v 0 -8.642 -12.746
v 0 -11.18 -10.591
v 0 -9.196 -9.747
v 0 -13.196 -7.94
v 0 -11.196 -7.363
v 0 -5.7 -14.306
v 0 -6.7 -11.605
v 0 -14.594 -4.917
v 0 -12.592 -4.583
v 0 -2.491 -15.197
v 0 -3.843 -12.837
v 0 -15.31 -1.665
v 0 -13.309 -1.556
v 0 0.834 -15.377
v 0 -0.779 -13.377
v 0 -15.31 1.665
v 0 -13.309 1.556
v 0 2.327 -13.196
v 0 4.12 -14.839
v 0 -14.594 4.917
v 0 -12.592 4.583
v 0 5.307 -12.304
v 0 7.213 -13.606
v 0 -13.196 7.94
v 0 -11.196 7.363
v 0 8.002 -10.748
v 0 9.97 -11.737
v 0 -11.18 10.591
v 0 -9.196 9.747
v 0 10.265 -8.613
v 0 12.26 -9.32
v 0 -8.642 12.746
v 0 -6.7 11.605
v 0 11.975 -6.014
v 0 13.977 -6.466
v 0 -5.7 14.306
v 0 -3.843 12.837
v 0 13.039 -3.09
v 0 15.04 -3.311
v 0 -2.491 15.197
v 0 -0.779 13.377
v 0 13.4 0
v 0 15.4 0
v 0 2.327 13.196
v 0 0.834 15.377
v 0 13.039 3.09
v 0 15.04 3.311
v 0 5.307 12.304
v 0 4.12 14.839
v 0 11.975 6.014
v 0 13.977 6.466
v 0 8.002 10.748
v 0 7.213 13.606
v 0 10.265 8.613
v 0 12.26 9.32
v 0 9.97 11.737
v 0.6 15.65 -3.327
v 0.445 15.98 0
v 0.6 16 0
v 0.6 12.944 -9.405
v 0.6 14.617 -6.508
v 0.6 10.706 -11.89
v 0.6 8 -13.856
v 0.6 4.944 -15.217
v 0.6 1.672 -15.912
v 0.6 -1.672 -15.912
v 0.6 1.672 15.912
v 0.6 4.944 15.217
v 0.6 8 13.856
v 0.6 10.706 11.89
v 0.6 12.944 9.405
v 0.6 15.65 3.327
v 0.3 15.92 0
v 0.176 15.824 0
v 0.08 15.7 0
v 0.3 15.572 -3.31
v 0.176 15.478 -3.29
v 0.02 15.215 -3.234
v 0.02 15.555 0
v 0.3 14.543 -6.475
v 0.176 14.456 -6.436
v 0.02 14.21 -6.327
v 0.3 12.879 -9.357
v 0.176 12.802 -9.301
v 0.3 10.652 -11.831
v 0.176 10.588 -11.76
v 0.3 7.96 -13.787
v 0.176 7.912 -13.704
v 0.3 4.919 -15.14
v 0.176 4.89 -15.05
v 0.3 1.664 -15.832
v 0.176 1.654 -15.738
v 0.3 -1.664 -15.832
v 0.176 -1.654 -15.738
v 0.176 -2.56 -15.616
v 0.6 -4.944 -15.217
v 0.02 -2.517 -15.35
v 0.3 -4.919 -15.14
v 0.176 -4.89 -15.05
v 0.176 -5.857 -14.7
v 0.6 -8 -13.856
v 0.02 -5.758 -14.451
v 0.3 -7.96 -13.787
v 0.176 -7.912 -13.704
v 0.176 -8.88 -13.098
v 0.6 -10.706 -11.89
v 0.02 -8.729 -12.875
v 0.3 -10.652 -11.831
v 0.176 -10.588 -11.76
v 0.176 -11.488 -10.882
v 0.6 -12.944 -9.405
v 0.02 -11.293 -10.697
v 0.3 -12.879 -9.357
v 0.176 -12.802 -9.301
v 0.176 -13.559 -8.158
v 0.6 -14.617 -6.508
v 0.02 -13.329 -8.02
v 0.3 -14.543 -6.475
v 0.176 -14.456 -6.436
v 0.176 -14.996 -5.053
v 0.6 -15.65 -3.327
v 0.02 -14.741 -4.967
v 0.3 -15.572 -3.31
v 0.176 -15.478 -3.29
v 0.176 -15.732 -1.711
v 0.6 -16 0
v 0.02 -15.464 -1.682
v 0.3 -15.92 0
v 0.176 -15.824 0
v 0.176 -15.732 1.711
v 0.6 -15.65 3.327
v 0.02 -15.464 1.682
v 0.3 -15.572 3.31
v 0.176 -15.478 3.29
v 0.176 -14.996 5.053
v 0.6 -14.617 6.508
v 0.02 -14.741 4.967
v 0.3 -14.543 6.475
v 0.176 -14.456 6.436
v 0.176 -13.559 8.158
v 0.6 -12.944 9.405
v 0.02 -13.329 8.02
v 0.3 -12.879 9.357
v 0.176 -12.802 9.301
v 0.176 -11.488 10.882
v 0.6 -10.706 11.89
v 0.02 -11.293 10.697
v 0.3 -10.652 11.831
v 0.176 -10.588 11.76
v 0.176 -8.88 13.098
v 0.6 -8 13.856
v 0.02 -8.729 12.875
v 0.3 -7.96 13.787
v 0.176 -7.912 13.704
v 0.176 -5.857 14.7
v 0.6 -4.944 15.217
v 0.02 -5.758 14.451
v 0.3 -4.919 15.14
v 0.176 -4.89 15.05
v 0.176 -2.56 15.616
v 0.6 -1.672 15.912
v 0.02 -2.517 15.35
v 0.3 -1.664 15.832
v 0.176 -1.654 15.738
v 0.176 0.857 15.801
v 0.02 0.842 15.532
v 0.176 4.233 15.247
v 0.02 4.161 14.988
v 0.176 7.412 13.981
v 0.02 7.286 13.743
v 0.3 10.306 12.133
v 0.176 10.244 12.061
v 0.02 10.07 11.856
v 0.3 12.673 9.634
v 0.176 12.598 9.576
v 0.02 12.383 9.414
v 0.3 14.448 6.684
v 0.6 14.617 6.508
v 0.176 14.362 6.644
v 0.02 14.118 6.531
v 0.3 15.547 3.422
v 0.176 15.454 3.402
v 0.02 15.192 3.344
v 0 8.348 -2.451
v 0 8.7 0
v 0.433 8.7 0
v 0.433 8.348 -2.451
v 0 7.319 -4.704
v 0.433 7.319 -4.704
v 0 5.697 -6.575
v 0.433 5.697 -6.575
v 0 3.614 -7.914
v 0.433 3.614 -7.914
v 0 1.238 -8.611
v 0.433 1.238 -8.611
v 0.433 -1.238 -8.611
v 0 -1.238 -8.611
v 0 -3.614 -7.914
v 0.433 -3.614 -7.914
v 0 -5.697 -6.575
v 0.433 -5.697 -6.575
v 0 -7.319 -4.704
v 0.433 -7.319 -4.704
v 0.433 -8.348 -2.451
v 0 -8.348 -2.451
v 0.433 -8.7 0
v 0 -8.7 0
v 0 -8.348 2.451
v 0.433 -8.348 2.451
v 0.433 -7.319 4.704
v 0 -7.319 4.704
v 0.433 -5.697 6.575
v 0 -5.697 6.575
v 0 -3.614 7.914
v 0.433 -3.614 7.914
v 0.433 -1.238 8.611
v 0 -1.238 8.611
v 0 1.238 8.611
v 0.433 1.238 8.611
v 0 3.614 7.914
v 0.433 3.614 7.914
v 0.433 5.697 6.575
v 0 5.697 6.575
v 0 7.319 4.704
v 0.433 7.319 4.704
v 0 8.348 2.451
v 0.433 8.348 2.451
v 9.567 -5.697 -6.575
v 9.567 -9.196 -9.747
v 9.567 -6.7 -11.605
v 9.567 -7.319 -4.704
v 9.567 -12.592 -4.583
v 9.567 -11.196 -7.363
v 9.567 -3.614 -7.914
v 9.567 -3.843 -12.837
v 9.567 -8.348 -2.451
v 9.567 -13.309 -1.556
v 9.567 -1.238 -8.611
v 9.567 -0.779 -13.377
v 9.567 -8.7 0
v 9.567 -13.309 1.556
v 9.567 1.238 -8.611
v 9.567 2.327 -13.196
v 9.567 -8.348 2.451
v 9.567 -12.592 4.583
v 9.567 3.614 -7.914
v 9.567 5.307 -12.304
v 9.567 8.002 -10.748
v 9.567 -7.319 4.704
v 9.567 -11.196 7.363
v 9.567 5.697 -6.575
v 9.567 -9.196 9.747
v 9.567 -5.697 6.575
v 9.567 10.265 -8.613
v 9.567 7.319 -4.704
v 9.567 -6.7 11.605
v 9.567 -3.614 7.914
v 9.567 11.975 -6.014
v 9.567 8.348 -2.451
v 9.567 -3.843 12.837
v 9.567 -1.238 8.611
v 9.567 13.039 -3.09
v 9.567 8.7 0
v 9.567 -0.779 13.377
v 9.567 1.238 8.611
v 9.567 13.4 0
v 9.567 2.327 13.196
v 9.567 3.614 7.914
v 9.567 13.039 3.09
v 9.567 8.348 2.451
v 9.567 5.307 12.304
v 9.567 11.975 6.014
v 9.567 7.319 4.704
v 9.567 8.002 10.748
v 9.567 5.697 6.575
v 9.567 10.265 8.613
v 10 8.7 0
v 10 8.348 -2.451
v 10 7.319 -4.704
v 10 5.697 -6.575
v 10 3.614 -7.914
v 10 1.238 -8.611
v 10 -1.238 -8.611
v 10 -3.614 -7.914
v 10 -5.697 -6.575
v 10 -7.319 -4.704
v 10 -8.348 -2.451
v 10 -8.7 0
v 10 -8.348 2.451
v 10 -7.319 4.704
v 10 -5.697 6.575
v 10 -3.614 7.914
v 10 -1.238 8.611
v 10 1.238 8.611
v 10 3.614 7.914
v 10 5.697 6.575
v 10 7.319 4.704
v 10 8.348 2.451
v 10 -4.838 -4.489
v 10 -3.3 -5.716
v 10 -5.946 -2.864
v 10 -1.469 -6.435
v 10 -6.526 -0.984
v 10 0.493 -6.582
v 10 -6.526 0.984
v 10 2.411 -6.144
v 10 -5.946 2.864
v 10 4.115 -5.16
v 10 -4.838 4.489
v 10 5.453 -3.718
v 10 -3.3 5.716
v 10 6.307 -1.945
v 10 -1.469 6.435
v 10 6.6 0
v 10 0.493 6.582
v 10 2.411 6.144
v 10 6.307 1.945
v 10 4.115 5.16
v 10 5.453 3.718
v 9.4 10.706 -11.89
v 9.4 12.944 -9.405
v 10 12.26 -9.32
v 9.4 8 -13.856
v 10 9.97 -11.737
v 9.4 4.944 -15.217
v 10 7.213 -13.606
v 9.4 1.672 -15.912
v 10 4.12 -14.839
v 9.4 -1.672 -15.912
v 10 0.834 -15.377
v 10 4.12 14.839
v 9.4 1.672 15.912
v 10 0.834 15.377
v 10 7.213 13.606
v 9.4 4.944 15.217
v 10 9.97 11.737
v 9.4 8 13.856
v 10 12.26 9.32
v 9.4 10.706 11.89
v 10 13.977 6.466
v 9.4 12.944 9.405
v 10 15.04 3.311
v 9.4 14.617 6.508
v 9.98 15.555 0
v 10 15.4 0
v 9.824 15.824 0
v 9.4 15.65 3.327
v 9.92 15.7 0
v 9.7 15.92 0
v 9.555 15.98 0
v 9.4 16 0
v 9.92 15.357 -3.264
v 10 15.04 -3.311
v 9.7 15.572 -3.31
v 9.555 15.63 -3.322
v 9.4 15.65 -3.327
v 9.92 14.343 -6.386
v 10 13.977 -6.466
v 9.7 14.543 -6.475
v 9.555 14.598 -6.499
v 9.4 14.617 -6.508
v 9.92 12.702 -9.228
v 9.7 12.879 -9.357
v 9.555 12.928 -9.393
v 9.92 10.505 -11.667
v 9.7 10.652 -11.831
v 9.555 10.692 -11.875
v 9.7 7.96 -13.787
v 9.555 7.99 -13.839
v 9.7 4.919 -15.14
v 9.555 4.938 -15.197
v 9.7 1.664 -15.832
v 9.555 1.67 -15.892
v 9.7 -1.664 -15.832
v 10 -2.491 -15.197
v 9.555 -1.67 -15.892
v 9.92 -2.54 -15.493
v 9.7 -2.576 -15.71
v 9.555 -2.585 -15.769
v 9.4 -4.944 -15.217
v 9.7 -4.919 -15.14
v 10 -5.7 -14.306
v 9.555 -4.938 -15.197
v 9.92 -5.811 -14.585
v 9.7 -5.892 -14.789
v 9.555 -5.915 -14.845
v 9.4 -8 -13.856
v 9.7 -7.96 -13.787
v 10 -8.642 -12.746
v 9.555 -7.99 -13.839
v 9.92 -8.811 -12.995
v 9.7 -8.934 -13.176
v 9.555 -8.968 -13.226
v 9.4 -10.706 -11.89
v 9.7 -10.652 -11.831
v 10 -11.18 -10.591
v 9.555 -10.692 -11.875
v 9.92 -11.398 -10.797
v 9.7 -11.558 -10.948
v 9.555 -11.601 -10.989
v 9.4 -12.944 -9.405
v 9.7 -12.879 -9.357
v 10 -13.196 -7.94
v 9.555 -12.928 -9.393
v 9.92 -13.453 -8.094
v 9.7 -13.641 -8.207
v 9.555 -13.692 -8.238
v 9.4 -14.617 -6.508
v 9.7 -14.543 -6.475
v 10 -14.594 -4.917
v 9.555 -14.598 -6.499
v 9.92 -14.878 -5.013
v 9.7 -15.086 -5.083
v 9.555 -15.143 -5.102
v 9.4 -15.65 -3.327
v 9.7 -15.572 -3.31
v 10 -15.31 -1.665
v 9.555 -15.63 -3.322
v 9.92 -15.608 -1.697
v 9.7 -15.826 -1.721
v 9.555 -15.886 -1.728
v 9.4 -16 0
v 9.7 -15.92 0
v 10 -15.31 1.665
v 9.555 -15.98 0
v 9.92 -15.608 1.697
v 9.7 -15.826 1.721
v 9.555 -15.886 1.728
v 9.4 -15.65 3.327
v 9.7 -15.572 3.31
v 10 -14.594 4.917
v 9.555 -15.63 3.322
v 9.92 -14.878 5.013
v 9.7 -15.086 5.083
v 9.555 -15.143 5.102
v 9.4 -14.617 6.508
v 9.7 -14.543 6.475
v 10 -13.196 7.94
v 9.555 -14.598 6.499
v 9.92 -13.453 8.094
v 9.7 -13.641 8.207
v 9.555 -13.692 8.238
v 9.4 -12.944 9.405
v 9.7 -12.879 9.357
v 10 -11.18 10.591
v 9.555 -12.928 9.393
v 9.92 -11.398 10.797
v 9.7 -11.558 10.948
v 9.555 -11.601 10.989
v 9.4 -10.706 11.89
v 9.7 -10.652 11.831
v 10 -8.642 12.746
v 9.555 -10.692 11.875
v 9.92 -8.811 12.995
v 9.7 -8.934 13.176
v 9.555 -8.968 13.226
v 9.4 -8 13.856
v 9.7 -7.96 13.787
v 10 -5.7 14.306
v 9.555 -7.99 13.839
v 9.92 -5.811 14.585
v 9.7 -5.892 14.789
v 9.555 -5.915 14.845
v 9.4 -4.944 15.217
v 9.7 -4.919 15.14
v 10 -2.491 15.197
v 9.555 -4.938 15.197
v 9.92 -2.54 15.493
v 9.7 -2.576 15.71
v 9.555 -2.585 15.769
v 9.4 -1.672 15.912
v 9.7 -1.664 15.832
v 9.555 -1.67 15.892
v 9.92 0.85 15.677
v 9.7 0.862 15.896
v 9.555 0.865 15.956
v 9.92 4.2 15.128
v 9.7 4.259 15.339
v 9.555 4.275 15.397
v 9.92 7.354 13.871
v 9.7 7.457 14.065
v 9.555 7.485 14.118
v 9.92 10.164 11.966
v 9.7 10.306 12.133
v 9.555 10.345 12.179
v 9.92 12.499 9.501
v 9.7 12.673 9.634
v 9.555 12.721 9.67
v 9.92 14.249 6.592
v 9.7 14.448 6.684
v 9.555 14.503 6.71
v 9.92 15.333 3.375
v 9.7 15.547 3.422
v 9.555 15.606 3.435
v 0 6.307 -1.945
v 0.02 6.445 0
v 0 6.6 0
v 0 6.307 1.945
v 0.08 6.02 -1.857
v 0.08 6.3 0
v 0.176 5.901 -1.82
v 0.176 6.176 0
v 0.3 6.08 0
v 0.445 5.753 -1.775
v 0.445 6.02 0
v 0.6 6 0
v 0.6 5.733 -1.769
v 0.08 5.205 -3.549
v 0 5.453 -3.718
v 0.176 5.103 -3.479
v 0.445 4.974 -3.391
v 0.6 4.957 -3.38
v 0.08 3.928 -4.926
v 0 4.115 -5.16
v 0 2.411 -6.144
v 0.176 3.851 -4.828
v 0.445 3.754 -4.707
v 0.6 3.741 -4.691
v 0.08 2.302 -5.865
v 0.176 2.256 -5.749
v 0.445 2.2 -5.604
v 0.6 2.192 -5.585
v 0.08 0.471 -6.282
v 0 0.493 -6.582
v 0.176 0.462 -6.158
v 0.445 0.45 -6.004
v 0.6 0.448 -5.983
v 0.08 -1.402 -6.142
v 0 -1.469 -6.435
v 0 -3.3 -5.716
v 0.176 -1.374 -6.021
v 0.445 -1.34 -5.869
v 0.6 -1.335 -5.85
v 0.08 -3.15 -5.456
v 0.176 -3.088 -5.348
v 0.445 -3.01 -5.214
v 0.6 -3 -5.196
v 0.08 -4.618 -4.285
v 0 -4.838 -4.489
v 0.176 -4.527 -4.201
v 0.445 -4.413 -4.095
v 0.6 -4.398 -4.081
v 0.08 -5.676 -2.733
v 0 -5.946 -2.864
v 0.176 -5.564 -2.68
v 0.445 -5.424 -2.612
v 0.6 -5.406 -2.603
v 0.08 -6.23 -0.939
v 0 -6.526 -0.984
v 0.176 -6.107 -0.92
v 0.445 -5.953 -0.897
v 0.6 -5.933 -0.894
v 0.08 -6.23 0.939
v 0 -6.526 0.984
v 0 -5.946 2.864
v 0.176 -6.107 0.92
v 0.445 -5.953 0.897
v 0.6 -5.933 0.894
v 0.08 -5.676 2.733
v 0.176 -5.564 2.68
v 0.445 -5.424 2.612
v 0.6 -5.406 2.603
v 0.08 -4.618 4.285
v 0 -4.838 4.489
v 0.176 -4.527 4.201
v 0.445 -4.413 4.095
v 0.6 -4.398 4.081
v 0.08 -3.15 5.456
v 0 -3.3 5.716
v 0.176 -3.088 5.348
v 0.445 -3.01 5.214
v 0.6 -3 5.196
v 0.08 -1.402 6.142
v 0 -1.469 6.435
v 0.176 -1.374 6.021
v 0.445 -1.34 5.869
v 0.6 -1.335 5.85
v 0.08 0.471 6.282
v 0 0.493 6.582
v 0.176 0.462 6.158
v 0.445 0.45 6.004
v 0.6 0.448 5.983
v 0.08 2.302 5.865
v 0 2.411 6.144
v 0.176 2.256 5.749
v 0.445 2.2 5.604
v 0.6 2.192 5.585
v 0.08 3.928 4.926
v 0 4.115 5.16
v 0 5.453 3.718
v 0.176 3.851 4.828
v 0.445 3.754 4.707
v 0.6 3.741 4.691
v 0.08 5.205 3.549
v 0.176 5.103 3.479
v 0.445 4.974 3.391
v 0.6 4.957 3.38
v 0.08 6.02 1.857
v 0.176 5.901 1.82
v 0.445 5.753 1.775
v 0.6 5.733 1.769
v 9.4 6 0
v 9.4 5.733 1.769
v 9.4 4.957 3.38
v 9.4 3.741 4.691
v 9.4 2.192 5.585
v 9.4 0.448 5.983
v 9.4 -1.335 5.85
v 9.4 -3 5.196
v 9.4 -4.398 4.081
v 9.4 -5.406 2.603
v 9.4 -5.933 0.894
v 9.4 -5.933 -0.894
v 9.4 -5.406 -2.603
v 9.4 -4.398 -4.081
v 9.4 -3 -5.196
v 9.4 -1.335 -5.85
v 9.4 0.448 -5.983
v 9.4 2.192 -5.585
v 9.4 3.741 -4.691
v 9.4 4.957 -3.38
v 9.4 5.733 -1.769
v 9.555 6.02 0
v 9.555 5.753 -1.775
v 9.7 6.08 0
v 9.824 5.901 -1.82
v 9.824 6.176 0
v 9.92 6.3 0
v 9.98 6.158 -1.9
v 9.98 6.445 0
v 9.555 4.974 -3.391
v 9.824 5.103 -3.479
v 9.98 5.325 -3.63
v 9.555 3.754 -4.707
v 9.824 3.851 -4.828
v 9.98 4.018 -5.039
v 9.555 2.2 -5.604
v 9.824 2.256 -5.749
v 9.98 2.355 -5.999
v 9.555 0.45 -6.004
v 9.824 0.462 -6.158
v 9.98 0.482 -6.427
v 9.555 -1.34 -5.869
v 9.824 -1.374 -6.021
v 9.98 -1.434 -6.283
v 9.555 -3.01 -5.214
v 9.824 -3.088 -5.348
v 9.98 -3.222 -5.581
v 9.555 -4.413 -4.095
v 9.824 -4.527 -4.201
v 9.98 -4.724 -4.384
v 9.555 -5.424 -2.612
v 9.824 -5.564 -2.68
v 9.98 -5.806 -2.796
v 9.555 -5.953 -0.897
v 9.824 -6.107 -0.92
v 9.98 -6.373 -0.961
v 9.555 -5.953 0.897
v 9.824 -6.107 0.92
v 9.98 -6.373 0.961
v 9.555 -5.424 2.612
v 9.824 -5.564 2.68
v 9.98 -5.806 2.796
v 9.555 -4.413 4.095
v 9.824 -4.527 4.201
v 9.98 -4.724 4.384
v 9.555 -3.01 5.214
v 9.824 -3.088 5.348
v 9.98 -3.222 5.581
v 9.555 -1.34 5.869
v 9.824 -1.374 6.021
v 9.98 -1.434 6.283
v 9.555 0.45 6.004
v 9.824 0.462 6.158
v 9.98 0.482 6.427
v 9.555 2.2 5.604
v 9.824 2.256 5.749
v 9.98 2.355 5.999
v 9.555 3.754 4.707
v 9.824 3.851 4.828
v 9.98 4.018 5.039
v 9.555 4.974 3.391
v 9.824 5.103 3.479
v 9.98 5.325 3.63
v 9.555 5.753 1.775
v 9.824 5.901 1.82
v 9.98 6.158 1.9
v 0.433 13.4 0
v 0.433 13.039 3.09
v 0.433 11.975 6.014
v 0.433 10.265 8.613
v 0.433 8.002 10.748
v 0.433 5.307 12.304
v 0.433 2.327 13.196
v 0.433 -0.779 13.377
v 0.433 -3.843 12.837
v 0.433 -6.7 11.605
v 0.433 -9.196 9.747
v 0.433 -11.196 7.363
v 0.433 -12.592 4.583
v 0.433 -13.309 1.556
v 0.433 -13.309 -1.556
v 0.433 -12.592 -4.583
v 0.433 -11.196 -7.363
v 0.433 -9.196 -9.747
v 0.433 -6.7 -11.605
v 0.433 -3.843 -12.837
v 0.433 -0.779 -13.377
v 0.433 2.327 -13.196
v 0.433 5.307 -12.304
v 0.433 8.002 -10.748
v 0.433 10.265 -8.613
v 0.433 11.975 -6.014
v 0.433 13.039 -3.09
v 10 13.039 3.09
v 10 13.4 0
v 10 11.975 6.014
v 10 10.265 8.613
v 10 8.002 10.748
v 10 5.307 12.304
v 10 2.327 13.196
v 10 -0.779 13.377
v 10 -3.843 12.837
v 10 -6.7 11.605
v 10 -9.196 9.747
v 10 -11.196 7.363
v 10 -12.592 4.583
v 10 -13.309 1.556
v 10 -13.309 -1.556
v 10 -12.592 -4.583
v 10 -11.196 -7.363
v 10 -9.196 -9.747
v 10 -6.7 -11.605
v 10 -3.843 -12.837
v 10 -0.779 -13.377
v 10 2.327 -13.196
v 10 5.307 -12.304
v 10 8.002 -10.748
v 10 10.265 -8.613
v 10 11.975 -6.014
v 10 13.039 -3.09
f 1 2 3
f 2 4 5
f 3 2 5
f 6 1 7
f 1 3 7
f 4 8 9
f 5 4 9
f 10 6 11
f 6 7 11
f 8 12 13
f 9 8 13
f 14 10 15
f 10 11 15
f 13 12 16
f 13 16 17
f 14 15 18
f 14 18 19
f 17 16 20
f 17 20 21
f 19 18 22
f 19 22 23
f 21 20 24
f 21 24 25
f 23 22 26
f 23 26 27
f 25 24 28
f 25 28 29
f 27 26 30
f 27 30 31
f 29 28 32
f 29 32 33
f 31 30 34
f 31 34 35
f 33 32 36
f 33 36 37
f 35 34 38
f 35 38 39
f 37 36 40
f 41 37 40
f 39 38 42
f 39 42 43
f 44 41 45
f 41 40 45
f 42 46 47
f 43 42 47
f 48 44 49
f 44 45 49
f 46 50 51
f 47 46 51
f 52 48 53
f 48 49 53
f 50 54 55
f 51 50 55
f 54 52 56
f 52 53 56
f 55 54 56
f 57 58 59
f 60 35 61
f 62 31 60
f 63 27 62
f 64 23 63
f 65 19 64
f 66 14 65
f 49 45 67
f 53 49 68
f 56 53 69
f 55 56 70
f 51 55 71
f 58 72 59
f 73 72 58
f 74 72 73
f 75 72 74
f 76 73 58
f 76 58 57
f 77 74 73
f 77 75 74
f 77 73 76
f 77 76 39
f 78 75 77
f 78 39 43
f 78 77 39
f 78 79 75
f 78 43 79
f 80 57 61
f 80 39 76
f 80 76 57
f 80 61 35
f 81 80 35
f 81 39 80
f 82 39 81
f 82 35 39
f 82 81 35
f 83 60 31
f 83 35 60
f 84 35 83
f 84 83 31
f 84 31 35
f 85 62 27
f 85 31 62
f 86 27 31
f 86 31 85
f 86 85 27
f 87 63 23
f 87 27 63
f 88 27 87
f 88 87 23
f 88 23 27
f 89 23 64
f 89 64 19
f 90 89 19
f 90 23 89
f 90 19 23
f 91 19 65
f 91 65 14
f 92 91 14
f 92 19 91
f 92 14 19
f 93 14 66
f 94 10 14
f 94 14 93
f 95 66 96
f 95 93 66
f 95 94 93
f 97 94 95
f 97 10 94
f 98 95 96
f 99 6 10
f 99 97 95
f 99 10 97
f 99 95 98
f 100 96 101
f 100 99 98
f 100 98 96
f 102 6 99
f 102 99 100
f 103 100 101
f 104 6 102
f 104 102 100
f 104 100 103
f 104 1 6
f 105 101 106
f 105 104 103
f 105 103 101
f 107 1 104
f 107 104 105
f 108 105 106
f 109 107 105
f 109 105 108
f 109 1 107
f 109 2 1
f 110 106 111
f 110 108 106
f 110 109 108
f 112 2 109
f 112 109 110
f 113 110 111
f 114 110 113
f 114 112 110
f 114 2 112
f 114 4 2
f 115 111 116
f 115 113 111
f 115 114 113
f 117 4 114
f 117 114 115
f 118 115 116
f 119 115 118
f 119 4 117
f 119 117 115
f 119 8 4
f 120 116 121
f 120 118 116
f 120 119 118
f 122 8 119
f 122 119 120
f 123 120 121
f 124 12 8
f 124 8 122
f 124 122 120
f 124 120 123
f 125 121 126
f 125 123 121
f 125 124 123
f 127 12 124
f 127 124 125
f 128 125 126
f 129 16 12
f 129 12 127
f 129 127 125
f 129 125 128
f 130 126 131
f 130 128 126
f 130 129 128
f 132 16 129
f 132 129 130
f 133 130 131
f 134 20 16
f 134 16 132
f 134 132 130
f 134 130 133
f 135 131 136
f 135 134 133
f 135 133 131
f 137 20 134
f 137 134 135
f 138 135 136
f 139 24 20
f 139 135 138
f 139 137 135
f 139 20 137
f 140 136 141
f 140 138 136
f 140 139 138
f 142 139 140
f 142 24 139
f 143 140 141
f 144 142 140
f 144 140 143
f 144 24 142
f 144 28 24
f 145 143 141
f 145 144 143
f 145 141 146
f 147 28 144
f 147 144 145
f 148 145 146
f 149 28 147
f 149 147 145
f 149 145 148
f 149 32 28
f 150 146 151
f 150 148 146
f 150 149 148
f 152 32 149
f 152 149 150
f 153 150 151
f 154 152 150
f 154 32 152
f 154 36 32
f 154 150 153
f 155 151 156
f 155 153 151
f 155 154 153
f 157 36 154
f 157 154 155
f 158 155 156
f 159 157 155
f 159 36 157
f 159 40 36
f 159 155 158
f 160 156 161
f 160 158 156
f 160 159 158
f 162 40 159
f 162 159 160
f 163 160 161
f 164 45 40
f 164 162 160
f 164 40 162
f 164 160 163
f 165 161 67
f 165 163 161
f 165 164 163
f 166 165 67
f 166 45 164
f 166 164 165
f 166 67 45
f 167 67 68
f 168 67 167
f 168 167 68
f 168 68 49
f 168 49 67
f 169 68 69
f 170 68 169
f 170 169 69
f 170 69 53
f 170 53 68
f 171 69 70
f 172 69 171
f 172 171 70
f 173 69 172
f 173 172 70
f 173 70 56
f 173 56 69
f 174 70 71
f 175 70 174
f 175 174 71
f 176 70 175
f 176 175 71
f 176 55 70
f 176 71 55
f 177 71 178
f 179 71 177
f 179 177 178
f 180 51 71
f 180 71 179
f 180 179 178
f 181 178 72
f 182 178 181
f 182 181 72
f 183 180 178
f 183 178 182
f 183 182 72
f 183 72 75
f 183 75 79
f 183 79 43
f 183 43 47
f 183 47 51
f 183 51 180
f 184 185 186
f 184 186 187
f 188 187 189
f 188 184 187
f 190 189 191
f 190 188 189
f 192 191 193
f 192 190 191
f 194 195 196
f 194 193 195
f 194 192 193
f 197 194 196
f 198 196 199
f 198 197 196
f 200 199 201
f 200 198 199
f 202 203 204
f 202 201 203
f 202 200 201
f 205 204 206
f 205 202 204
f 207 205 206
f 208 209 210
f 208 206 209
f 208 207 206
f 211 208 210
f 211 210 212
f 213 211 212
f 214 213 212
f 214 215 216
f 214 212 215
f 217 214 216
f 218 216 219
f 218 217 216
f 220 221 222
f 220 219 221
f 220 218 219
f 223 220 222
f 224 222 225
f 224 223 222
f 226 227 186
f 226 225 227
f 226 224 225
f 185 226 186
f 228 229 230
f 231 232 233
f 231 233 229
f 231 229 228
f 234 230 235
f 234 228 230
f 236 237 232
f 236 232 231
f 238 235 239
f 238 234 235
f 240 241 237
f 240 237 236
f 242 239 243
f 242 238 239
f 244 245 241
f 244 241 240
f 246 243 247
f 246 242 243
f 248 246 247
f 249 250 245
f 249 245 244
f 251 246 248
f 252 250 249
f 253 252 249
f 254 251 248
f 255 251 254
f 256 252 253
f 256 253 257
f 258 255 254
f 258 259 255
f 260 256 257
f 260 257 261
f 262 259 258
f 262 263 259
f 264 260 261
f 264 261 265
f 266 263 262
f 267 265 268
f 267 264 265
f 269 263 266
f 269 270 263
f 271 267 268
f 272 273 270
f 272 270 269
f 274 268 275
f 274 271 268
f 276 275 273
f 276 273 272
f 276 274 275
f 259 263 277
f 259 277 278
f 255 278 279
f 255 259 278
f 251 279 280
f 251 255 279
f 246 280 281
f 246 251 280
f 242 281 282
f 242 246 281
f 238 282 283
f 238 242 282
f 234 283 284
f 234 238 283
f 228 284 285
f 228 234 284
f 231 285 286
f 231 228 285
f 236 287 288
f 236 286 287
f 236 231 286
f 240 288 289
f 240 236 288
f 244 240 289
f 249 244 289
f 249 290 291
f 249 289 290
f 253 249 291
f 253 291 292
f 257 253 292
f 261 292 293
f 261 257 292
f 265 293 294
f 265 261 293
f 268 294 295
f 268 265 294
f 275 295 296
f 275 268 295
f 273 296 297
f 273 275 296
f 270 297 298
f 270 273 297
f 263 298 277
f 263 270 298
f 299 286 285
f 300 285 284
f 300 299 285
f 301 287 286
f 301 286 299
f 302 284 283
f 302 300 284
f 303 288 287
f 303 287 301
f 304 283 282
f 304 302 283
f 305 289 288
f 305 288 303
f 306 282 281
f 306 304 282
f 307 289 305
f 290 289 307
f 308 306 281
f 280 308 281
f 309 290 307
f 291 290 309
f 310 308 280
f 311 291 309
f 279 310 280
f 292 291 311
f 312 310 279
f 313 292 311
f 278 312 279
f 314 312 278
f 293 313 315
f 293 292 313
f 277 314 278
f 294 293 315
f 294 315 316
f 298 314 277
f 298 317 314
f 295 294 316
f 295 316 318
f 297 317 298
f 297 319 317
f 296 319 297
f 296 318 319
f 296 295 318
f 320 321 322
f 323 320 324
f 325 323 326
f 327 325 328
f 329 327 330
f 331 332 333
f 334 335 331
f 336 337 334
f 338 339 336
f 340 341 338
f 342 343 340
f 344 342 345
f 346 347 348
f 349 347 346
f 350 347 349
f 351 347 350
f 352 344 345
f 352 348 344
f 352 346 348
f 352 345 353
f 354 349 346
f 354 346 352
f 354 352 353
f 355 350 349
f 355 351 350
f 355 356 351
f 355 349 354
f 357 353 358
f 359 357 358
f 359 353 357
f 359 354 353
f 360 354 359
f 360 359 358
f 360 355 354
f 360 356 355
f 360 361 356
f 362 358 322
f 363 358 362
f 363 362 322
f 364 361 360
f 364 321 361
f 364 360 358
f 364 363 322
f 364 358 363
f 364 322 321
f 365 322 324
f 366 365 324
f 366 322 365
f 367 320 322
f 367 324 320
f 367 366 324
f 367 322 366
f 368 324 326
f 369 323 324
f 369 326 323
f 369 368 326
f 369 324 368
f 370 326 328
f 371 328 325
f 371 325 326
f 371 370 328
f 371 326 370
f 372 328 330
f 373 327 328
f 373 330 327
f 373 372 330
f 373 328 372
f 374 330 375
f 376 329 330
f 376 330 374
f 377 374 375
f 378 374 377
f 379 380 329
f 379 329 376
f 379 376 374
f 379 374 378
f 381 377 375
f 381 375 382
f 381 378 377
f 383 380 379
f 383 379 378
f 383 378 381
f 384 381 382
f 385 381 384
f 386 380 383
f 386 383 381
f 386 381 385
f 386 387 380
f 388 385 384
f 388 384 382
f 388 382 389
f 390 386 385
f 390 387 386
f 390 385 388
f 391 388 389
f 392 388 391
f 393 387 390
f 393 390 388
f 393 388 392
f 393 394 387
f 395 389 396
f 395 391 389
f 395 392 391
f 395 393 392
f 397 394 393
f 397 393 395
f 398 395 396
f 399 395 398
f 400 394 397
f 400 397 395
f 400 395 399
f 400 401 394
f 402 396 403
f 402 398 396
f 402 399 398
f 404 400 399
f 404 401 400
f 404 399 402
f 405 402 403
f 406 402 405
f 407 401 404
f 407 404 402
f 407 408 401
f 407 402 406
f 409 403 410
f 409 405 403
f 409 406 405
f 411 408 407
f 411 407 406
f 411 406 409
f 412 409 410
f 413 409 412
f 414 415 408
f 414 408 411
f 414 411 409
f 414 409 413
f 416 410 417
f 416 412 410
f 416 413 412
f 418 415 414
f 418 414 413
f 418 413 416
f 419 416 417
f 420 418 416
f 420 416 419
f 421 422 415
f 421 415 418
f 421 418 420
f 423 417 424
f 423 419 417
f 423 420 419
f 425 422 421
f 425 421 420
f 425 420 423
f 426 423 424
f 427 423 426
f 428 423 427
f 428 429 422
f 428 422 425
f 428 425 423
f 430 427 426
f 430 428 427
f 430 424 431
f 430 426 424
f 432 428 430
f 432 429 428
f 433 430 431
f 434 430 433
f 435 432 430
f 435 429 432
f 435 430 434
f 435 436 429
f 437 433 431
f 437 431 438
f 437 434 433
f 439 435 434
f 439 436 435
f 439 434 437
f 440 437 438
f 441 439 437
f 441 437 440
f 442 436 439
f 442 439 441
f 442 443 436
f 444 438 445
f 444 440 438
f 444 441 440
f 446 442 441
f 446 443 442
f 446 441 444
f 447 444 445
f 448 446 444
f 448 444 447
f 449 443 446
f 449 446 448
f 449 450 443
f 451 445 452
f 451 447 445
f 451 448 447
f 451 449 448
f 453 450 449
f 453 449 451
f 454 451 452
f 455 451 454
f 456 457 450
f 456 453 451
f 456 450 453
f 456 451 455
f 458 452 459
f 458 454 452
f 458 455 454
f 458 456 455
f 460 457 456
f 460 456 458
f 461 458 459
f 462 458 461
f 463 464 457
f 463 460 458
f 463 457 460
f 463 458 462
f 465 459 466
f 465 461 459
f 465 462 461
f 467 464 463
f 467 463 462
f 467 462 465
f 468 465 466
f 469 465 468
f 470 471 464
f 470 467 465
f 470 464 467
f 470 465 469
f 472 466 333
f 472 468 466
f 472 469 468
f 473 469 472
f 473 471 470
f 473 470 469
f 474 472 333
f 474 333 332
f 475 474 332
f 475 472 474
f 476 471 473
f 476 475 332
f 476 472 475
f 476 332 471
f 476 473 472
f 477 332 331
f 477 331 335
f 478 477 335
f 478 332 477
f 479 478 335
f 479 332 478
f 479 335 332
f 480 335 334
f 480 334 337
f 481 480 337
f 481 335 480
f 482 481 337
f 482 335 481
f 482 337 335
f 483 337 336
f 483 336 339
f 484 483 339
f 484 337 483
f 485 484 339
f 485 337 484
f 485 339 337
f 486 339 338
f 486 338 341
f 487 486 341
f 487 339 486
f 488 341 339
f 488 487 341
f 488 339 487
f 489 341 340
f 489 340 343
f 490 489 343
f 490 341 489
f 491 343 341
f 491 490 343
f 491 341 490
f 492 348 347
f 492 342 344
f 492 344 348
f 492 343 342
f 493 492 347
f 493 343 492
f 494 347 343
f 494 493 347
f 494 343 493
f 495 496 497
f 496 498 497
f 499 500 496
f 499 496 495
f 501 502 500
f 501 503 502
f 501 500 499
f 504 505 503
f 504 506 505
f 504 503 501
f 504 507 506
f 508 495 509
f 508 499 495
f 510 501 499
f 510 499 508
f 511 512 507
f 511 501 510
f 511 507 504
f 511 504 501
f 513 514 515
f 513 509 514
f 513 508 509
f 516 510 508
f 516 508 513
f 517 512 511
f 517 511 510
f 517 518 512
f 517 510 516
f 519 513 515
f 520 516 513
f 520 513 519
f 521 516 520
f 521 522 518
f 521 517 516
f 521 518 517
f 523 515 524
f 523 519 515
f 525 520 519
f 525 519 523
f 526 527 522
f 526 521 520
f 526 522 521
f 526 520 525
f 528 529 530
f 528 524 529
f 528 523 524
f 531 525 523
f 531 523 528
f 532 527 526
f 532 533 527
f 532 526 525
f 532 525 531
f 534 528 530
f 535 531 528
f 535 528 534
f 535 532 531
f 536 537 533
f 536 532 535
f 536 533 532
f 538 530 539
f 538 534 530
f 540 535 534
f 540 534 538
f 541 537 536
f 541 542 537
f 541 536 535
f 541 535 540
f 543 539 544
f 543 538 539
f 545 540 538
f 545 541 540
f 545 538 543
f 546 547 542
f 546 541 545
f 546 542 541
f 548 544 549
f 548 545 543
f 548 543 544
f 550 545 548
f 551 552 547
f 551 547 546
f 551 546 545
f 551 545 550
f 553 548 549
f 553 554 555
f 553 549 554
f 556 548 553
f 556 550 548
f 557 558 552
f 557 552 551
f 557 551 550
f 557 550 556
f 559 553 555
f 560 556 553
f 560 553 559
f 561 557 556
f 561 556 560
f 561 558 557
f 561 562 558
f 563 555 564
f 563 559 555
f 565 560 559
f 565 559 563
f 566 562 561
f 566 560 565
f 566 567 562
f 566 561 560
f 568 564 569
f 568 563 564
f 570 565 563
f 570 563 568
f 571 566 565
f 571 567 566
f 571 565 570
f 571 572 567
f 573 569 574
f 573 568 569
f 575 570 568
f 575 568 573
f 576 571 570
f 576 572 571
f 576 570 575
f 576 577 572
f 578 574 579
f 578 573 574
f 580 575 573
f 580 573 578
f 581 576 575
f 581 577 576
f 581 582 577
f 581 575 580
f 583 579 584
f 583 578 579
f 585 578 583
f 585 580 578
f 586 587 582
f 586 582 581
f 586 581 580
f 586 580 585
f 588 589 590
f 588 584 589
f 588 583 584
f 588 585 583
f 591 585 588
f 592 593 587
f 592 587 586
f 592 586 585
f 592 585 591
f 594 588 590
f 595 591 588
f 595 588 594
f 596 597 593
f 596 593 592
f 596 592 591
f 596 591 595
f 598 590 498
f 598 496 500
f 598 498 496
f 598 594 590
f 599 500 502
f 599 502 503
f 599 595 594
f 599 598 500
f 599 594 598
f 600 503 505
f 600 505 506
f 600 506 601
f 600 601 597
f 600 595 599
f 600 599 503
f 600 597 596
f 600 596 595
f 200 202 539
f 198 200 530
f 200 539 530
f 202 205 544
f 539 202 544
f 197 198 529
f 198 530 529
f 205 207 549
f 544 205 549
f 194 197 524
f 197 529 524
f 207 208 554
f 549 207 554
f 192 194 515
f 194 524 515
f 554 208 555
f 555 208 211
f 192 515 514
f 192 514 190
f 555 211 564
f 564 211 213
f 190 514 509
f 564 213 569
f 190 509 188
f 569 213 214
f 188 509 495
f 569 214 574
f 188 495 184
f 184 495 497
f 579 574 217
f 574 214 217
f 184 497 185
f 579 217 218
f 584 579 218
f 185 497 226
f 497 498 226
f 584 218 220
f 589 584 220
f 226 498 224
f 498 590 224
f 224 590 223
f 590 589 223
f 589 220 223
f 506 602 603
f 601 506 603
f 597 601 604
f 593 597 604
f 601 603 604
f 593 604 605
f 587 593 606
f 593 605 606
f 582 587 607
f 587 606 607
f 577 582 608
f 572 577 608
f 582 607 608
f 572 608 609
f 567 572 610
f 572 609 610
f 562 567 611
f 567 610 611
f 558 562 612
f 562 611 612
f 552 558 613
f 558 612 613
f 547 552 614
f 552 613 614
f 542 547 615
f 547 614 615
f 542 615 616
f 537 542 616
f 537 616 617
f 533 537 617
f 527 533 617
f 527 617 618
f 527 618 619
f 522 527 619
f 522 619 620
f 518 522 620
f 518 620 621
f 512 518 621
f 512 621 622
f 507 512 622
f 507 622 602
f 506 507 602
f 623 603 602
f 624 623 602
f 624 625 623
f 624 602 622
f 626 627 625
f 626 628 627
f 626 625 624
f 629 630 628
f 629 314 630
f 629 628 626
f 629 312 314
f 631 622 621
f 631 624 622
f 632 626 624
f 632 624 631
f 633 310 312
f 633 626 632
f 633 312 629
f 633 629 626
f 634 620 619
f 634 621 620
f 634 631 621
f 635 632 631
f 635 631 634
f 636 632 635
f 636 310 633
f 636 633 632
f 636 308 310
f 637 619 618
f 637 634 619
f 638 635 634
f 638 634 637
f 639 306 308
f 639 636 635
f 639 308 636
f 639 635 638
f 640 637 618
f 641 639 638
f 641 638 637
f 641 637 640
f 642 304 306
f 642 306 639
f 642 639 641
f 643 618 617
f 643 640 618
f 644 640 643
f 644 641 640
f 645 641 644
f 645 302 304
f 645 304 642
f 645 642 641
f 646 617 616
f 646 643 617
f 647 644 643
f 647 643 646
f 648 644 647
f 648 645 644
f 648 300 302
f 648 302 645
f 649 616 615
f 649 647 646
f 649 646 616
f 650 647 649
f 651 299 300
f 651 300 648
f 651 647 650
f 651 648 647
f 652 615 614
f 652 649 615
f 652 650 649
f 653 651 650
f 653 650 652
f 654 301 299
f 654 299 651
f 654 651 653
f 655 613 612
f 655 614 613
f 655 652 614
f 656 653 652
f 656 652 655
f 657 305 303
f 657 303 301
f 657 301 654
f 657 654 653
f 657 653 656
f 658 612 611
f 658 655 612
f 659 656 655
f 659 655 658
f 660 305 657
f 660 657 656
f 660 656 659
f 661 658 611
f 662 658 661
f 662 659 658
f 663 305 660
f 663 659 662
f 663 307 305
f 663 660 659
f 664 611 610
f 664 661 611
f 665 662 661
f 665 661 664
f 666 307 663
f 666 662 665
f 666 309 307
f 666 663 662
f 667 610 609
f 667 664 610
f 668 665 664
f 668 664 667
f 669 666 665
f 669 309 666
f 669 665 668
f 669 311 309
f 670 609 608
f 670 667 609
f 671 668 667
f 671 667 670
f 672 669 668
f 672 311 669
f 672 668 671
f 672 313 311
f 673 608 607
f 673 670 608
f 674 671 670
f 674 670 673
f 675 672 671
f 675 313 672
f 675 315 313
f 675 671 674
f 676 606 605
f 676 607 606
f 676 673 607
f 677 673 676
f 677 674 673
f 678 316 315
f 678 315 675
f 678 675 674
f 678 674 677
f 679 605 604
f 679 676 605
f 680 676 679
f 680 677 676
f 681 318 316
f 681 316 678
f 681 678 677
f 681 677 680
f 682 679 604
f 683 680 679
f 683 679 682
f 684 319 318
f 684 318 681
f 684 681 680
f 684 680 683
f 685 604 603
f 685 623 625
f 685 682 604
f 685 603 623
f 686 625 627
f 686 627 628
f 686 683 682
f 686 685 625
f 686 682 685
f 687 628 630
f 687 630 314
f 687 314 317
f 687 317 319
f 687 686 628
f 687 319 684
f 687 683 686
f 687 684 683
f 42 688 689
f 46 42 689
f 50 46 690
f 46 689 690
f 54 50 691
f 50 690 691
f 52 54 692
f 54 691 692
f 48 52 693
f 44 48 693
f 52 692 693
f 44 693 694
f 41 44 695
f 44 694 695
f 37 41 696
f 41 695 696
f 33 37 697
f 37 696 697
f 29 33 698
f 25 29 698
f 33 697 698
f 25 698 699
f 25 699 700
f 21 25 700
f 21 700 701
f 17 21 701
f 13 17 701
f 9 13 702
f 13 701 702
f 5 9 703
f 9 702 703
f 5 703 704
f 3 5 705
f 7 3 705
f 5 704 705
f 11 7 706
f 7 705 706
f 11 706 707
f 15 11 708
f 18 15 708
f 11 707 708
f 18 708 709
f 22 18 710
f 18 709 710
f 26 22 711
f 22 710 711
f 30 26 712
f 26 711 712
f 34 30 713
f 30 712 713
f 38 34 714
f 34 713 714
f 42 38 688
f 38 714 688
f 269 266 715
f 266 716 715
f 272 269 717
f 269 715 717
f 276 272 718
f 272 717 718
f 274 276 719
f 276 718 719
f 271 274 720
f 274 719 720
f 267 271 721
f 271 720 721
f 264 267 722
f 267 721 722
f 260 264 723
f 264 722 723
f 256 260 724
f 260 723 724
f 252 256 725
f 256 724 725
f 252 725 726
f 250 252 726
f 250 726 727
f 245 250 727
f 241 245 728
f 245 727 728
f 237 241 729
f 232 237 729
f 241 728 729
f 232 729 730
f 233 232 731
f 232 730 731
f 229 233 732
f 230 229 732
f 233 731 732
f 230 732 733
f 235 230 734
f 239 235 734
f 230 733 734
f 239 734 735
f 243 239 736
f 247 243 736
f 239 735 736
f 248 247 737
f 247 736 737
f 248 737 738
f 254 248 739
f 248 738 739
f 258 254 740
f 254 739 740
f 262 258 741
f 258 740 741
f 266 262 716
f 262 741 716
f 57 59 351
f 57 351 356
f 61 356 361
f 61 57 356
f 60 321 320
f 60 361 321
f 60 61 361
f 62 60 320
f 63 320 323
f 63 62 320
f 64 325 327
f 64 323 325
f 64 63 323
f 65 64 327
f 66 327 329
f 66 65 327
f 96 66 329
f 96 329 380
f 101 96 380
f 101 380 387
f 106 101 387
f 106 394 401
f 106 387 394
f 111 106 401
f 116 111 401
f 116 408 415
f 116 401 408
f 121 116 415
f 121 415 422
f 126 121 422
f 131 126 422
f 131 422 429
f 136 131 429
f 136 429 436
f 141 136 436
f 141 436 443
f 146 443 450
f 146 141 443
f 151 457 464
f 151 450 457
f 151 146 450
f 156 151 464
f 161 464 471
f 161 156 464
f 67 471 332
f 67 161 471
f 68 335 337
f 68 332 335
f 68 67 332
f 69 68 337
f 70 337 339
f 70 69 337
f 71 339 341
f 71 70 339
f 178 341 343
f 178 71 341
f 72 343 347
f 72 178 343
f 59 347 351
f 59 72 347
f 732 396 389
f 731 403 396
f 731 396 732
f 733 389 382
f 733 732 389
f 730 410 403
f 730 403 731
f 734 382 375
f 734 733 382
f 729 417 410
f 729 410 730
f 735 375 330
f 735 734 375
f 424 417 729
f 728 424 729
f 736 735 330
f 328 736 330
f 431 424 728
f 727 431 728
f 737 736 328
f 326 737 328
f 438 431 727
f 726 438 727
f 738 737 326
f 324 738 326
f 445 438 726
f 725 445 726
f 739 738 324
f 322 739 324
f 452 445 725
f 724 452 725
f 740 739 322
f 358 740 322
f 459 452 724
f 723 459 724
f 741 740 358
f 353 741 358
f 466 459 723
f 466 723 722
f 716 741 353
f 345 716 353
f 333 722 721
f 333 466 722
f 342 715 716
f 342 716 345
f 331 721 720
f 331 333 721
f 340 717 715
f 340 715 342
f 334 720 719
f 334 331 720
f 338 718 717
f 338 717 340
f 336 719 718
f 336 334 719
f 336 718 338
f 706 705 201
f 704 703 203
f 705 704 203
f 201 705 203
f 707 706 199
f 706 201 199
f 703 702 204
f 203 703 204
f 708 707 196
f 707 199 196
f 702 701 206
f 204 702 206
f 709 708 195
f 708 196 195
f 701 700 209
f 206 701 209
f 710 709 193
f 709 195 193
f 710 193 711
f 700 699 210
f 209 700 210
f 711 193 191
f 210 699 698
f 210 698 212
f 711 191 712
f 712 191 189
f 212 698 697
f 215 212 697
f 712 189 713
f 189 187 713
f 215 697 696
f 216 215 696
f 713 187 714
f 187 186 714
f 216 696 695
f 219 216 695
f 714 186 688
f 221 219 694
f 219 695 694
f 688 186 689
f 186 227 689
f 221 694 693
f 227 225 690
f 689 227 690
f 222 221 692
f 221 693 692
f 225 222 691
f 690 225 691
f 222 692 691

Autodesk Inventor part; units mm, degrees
sketch "Sketch_1" plane through (0, 0, 0) normal (0, 0, 1) x (1, 0, 0)
  line L0 (10, 0) -> (0, 0)
  line L1 (0, 15.4) -> (0, 13.4)
  line L2 (0, 13.4) -> (0.433, 13.4)
  line L3 (0.433, 13.4) -> (0.433, 8.7)
  line L4 (0.433, 8.7) -> (0, 8.7)
  line L5 (0, 8.7) -> (0, 6.6)
  arc A0 (0, 6.6) -> (0.6, 6) centre (0.6, 6.6) ccw
  line L6 (0.6, 6) -> (9.4, 6)
  arc A1 (9.4, 6) -> (10, 6.6) centre (9.4, 6.6) ccw
  line L7 (10, 6.6) -> (10, 8.7)
  line L8 (10, 8.7) -> (9.567, 8.7)
  line L9 (9.567, 8.7) -> (9.567, 13.4)
  line L10 (9.567, 13.4) -> (10, 13.4)
  line L11 (10, 13.4) -> (10, 15.4)
  arc A2 (10, 15.4) -> (9.4, 16) centre (9.4, 15.4) ccw
  line L12 (9.4, 16) -> (0.6, 16)
  arc A3 (0.6, 16) -> (0, 15.4) centre (0.6, 15.4) ccw
revolve "Revolution1" add sketch "Sketch_1" angle 360 about axis through (10, 0, 0) along (1, 0, 0)
ref_plane "center_point_XY" through (5, 0, 0) normal (1, 0, 0) x (0, 0, -1)
ref_plane "center_point_YZ" through (5, 0, 0) normal (0, 0, -1) x (0, 1, 0)
ref_plane "center_point_ZX" through (5, 0, 0) normal (0, 1, 0) x (1, 0, 0)
ref_plane "to_housing_XY" through (0, 0, 0) normal (1, 0, 0) x (0, 0, -1)
ref_plane "to_housing_YZ" through (0, 0, 0) normal (0, 0, -1) x (0, 1, 0)
ref_plane "to_housing_ZX" through (0, 0, 0) normal (0, 1, 0) x (1, 0, 0)
ref_plane "to_ring_XY" through (9.134, 0, 0) normal (1, 0, 0) x (0, 0, -1)
ref_plane "to_ring_YZ" through (9.134, 0, 0) normal (0, 0, -1) x (0, 1, 0)
ref_plane "to_ring_ZX" through (9.134, 0, 0) normal (0, 1, 0) x (1, 0, 0)
properties part number "bearing_6201"
